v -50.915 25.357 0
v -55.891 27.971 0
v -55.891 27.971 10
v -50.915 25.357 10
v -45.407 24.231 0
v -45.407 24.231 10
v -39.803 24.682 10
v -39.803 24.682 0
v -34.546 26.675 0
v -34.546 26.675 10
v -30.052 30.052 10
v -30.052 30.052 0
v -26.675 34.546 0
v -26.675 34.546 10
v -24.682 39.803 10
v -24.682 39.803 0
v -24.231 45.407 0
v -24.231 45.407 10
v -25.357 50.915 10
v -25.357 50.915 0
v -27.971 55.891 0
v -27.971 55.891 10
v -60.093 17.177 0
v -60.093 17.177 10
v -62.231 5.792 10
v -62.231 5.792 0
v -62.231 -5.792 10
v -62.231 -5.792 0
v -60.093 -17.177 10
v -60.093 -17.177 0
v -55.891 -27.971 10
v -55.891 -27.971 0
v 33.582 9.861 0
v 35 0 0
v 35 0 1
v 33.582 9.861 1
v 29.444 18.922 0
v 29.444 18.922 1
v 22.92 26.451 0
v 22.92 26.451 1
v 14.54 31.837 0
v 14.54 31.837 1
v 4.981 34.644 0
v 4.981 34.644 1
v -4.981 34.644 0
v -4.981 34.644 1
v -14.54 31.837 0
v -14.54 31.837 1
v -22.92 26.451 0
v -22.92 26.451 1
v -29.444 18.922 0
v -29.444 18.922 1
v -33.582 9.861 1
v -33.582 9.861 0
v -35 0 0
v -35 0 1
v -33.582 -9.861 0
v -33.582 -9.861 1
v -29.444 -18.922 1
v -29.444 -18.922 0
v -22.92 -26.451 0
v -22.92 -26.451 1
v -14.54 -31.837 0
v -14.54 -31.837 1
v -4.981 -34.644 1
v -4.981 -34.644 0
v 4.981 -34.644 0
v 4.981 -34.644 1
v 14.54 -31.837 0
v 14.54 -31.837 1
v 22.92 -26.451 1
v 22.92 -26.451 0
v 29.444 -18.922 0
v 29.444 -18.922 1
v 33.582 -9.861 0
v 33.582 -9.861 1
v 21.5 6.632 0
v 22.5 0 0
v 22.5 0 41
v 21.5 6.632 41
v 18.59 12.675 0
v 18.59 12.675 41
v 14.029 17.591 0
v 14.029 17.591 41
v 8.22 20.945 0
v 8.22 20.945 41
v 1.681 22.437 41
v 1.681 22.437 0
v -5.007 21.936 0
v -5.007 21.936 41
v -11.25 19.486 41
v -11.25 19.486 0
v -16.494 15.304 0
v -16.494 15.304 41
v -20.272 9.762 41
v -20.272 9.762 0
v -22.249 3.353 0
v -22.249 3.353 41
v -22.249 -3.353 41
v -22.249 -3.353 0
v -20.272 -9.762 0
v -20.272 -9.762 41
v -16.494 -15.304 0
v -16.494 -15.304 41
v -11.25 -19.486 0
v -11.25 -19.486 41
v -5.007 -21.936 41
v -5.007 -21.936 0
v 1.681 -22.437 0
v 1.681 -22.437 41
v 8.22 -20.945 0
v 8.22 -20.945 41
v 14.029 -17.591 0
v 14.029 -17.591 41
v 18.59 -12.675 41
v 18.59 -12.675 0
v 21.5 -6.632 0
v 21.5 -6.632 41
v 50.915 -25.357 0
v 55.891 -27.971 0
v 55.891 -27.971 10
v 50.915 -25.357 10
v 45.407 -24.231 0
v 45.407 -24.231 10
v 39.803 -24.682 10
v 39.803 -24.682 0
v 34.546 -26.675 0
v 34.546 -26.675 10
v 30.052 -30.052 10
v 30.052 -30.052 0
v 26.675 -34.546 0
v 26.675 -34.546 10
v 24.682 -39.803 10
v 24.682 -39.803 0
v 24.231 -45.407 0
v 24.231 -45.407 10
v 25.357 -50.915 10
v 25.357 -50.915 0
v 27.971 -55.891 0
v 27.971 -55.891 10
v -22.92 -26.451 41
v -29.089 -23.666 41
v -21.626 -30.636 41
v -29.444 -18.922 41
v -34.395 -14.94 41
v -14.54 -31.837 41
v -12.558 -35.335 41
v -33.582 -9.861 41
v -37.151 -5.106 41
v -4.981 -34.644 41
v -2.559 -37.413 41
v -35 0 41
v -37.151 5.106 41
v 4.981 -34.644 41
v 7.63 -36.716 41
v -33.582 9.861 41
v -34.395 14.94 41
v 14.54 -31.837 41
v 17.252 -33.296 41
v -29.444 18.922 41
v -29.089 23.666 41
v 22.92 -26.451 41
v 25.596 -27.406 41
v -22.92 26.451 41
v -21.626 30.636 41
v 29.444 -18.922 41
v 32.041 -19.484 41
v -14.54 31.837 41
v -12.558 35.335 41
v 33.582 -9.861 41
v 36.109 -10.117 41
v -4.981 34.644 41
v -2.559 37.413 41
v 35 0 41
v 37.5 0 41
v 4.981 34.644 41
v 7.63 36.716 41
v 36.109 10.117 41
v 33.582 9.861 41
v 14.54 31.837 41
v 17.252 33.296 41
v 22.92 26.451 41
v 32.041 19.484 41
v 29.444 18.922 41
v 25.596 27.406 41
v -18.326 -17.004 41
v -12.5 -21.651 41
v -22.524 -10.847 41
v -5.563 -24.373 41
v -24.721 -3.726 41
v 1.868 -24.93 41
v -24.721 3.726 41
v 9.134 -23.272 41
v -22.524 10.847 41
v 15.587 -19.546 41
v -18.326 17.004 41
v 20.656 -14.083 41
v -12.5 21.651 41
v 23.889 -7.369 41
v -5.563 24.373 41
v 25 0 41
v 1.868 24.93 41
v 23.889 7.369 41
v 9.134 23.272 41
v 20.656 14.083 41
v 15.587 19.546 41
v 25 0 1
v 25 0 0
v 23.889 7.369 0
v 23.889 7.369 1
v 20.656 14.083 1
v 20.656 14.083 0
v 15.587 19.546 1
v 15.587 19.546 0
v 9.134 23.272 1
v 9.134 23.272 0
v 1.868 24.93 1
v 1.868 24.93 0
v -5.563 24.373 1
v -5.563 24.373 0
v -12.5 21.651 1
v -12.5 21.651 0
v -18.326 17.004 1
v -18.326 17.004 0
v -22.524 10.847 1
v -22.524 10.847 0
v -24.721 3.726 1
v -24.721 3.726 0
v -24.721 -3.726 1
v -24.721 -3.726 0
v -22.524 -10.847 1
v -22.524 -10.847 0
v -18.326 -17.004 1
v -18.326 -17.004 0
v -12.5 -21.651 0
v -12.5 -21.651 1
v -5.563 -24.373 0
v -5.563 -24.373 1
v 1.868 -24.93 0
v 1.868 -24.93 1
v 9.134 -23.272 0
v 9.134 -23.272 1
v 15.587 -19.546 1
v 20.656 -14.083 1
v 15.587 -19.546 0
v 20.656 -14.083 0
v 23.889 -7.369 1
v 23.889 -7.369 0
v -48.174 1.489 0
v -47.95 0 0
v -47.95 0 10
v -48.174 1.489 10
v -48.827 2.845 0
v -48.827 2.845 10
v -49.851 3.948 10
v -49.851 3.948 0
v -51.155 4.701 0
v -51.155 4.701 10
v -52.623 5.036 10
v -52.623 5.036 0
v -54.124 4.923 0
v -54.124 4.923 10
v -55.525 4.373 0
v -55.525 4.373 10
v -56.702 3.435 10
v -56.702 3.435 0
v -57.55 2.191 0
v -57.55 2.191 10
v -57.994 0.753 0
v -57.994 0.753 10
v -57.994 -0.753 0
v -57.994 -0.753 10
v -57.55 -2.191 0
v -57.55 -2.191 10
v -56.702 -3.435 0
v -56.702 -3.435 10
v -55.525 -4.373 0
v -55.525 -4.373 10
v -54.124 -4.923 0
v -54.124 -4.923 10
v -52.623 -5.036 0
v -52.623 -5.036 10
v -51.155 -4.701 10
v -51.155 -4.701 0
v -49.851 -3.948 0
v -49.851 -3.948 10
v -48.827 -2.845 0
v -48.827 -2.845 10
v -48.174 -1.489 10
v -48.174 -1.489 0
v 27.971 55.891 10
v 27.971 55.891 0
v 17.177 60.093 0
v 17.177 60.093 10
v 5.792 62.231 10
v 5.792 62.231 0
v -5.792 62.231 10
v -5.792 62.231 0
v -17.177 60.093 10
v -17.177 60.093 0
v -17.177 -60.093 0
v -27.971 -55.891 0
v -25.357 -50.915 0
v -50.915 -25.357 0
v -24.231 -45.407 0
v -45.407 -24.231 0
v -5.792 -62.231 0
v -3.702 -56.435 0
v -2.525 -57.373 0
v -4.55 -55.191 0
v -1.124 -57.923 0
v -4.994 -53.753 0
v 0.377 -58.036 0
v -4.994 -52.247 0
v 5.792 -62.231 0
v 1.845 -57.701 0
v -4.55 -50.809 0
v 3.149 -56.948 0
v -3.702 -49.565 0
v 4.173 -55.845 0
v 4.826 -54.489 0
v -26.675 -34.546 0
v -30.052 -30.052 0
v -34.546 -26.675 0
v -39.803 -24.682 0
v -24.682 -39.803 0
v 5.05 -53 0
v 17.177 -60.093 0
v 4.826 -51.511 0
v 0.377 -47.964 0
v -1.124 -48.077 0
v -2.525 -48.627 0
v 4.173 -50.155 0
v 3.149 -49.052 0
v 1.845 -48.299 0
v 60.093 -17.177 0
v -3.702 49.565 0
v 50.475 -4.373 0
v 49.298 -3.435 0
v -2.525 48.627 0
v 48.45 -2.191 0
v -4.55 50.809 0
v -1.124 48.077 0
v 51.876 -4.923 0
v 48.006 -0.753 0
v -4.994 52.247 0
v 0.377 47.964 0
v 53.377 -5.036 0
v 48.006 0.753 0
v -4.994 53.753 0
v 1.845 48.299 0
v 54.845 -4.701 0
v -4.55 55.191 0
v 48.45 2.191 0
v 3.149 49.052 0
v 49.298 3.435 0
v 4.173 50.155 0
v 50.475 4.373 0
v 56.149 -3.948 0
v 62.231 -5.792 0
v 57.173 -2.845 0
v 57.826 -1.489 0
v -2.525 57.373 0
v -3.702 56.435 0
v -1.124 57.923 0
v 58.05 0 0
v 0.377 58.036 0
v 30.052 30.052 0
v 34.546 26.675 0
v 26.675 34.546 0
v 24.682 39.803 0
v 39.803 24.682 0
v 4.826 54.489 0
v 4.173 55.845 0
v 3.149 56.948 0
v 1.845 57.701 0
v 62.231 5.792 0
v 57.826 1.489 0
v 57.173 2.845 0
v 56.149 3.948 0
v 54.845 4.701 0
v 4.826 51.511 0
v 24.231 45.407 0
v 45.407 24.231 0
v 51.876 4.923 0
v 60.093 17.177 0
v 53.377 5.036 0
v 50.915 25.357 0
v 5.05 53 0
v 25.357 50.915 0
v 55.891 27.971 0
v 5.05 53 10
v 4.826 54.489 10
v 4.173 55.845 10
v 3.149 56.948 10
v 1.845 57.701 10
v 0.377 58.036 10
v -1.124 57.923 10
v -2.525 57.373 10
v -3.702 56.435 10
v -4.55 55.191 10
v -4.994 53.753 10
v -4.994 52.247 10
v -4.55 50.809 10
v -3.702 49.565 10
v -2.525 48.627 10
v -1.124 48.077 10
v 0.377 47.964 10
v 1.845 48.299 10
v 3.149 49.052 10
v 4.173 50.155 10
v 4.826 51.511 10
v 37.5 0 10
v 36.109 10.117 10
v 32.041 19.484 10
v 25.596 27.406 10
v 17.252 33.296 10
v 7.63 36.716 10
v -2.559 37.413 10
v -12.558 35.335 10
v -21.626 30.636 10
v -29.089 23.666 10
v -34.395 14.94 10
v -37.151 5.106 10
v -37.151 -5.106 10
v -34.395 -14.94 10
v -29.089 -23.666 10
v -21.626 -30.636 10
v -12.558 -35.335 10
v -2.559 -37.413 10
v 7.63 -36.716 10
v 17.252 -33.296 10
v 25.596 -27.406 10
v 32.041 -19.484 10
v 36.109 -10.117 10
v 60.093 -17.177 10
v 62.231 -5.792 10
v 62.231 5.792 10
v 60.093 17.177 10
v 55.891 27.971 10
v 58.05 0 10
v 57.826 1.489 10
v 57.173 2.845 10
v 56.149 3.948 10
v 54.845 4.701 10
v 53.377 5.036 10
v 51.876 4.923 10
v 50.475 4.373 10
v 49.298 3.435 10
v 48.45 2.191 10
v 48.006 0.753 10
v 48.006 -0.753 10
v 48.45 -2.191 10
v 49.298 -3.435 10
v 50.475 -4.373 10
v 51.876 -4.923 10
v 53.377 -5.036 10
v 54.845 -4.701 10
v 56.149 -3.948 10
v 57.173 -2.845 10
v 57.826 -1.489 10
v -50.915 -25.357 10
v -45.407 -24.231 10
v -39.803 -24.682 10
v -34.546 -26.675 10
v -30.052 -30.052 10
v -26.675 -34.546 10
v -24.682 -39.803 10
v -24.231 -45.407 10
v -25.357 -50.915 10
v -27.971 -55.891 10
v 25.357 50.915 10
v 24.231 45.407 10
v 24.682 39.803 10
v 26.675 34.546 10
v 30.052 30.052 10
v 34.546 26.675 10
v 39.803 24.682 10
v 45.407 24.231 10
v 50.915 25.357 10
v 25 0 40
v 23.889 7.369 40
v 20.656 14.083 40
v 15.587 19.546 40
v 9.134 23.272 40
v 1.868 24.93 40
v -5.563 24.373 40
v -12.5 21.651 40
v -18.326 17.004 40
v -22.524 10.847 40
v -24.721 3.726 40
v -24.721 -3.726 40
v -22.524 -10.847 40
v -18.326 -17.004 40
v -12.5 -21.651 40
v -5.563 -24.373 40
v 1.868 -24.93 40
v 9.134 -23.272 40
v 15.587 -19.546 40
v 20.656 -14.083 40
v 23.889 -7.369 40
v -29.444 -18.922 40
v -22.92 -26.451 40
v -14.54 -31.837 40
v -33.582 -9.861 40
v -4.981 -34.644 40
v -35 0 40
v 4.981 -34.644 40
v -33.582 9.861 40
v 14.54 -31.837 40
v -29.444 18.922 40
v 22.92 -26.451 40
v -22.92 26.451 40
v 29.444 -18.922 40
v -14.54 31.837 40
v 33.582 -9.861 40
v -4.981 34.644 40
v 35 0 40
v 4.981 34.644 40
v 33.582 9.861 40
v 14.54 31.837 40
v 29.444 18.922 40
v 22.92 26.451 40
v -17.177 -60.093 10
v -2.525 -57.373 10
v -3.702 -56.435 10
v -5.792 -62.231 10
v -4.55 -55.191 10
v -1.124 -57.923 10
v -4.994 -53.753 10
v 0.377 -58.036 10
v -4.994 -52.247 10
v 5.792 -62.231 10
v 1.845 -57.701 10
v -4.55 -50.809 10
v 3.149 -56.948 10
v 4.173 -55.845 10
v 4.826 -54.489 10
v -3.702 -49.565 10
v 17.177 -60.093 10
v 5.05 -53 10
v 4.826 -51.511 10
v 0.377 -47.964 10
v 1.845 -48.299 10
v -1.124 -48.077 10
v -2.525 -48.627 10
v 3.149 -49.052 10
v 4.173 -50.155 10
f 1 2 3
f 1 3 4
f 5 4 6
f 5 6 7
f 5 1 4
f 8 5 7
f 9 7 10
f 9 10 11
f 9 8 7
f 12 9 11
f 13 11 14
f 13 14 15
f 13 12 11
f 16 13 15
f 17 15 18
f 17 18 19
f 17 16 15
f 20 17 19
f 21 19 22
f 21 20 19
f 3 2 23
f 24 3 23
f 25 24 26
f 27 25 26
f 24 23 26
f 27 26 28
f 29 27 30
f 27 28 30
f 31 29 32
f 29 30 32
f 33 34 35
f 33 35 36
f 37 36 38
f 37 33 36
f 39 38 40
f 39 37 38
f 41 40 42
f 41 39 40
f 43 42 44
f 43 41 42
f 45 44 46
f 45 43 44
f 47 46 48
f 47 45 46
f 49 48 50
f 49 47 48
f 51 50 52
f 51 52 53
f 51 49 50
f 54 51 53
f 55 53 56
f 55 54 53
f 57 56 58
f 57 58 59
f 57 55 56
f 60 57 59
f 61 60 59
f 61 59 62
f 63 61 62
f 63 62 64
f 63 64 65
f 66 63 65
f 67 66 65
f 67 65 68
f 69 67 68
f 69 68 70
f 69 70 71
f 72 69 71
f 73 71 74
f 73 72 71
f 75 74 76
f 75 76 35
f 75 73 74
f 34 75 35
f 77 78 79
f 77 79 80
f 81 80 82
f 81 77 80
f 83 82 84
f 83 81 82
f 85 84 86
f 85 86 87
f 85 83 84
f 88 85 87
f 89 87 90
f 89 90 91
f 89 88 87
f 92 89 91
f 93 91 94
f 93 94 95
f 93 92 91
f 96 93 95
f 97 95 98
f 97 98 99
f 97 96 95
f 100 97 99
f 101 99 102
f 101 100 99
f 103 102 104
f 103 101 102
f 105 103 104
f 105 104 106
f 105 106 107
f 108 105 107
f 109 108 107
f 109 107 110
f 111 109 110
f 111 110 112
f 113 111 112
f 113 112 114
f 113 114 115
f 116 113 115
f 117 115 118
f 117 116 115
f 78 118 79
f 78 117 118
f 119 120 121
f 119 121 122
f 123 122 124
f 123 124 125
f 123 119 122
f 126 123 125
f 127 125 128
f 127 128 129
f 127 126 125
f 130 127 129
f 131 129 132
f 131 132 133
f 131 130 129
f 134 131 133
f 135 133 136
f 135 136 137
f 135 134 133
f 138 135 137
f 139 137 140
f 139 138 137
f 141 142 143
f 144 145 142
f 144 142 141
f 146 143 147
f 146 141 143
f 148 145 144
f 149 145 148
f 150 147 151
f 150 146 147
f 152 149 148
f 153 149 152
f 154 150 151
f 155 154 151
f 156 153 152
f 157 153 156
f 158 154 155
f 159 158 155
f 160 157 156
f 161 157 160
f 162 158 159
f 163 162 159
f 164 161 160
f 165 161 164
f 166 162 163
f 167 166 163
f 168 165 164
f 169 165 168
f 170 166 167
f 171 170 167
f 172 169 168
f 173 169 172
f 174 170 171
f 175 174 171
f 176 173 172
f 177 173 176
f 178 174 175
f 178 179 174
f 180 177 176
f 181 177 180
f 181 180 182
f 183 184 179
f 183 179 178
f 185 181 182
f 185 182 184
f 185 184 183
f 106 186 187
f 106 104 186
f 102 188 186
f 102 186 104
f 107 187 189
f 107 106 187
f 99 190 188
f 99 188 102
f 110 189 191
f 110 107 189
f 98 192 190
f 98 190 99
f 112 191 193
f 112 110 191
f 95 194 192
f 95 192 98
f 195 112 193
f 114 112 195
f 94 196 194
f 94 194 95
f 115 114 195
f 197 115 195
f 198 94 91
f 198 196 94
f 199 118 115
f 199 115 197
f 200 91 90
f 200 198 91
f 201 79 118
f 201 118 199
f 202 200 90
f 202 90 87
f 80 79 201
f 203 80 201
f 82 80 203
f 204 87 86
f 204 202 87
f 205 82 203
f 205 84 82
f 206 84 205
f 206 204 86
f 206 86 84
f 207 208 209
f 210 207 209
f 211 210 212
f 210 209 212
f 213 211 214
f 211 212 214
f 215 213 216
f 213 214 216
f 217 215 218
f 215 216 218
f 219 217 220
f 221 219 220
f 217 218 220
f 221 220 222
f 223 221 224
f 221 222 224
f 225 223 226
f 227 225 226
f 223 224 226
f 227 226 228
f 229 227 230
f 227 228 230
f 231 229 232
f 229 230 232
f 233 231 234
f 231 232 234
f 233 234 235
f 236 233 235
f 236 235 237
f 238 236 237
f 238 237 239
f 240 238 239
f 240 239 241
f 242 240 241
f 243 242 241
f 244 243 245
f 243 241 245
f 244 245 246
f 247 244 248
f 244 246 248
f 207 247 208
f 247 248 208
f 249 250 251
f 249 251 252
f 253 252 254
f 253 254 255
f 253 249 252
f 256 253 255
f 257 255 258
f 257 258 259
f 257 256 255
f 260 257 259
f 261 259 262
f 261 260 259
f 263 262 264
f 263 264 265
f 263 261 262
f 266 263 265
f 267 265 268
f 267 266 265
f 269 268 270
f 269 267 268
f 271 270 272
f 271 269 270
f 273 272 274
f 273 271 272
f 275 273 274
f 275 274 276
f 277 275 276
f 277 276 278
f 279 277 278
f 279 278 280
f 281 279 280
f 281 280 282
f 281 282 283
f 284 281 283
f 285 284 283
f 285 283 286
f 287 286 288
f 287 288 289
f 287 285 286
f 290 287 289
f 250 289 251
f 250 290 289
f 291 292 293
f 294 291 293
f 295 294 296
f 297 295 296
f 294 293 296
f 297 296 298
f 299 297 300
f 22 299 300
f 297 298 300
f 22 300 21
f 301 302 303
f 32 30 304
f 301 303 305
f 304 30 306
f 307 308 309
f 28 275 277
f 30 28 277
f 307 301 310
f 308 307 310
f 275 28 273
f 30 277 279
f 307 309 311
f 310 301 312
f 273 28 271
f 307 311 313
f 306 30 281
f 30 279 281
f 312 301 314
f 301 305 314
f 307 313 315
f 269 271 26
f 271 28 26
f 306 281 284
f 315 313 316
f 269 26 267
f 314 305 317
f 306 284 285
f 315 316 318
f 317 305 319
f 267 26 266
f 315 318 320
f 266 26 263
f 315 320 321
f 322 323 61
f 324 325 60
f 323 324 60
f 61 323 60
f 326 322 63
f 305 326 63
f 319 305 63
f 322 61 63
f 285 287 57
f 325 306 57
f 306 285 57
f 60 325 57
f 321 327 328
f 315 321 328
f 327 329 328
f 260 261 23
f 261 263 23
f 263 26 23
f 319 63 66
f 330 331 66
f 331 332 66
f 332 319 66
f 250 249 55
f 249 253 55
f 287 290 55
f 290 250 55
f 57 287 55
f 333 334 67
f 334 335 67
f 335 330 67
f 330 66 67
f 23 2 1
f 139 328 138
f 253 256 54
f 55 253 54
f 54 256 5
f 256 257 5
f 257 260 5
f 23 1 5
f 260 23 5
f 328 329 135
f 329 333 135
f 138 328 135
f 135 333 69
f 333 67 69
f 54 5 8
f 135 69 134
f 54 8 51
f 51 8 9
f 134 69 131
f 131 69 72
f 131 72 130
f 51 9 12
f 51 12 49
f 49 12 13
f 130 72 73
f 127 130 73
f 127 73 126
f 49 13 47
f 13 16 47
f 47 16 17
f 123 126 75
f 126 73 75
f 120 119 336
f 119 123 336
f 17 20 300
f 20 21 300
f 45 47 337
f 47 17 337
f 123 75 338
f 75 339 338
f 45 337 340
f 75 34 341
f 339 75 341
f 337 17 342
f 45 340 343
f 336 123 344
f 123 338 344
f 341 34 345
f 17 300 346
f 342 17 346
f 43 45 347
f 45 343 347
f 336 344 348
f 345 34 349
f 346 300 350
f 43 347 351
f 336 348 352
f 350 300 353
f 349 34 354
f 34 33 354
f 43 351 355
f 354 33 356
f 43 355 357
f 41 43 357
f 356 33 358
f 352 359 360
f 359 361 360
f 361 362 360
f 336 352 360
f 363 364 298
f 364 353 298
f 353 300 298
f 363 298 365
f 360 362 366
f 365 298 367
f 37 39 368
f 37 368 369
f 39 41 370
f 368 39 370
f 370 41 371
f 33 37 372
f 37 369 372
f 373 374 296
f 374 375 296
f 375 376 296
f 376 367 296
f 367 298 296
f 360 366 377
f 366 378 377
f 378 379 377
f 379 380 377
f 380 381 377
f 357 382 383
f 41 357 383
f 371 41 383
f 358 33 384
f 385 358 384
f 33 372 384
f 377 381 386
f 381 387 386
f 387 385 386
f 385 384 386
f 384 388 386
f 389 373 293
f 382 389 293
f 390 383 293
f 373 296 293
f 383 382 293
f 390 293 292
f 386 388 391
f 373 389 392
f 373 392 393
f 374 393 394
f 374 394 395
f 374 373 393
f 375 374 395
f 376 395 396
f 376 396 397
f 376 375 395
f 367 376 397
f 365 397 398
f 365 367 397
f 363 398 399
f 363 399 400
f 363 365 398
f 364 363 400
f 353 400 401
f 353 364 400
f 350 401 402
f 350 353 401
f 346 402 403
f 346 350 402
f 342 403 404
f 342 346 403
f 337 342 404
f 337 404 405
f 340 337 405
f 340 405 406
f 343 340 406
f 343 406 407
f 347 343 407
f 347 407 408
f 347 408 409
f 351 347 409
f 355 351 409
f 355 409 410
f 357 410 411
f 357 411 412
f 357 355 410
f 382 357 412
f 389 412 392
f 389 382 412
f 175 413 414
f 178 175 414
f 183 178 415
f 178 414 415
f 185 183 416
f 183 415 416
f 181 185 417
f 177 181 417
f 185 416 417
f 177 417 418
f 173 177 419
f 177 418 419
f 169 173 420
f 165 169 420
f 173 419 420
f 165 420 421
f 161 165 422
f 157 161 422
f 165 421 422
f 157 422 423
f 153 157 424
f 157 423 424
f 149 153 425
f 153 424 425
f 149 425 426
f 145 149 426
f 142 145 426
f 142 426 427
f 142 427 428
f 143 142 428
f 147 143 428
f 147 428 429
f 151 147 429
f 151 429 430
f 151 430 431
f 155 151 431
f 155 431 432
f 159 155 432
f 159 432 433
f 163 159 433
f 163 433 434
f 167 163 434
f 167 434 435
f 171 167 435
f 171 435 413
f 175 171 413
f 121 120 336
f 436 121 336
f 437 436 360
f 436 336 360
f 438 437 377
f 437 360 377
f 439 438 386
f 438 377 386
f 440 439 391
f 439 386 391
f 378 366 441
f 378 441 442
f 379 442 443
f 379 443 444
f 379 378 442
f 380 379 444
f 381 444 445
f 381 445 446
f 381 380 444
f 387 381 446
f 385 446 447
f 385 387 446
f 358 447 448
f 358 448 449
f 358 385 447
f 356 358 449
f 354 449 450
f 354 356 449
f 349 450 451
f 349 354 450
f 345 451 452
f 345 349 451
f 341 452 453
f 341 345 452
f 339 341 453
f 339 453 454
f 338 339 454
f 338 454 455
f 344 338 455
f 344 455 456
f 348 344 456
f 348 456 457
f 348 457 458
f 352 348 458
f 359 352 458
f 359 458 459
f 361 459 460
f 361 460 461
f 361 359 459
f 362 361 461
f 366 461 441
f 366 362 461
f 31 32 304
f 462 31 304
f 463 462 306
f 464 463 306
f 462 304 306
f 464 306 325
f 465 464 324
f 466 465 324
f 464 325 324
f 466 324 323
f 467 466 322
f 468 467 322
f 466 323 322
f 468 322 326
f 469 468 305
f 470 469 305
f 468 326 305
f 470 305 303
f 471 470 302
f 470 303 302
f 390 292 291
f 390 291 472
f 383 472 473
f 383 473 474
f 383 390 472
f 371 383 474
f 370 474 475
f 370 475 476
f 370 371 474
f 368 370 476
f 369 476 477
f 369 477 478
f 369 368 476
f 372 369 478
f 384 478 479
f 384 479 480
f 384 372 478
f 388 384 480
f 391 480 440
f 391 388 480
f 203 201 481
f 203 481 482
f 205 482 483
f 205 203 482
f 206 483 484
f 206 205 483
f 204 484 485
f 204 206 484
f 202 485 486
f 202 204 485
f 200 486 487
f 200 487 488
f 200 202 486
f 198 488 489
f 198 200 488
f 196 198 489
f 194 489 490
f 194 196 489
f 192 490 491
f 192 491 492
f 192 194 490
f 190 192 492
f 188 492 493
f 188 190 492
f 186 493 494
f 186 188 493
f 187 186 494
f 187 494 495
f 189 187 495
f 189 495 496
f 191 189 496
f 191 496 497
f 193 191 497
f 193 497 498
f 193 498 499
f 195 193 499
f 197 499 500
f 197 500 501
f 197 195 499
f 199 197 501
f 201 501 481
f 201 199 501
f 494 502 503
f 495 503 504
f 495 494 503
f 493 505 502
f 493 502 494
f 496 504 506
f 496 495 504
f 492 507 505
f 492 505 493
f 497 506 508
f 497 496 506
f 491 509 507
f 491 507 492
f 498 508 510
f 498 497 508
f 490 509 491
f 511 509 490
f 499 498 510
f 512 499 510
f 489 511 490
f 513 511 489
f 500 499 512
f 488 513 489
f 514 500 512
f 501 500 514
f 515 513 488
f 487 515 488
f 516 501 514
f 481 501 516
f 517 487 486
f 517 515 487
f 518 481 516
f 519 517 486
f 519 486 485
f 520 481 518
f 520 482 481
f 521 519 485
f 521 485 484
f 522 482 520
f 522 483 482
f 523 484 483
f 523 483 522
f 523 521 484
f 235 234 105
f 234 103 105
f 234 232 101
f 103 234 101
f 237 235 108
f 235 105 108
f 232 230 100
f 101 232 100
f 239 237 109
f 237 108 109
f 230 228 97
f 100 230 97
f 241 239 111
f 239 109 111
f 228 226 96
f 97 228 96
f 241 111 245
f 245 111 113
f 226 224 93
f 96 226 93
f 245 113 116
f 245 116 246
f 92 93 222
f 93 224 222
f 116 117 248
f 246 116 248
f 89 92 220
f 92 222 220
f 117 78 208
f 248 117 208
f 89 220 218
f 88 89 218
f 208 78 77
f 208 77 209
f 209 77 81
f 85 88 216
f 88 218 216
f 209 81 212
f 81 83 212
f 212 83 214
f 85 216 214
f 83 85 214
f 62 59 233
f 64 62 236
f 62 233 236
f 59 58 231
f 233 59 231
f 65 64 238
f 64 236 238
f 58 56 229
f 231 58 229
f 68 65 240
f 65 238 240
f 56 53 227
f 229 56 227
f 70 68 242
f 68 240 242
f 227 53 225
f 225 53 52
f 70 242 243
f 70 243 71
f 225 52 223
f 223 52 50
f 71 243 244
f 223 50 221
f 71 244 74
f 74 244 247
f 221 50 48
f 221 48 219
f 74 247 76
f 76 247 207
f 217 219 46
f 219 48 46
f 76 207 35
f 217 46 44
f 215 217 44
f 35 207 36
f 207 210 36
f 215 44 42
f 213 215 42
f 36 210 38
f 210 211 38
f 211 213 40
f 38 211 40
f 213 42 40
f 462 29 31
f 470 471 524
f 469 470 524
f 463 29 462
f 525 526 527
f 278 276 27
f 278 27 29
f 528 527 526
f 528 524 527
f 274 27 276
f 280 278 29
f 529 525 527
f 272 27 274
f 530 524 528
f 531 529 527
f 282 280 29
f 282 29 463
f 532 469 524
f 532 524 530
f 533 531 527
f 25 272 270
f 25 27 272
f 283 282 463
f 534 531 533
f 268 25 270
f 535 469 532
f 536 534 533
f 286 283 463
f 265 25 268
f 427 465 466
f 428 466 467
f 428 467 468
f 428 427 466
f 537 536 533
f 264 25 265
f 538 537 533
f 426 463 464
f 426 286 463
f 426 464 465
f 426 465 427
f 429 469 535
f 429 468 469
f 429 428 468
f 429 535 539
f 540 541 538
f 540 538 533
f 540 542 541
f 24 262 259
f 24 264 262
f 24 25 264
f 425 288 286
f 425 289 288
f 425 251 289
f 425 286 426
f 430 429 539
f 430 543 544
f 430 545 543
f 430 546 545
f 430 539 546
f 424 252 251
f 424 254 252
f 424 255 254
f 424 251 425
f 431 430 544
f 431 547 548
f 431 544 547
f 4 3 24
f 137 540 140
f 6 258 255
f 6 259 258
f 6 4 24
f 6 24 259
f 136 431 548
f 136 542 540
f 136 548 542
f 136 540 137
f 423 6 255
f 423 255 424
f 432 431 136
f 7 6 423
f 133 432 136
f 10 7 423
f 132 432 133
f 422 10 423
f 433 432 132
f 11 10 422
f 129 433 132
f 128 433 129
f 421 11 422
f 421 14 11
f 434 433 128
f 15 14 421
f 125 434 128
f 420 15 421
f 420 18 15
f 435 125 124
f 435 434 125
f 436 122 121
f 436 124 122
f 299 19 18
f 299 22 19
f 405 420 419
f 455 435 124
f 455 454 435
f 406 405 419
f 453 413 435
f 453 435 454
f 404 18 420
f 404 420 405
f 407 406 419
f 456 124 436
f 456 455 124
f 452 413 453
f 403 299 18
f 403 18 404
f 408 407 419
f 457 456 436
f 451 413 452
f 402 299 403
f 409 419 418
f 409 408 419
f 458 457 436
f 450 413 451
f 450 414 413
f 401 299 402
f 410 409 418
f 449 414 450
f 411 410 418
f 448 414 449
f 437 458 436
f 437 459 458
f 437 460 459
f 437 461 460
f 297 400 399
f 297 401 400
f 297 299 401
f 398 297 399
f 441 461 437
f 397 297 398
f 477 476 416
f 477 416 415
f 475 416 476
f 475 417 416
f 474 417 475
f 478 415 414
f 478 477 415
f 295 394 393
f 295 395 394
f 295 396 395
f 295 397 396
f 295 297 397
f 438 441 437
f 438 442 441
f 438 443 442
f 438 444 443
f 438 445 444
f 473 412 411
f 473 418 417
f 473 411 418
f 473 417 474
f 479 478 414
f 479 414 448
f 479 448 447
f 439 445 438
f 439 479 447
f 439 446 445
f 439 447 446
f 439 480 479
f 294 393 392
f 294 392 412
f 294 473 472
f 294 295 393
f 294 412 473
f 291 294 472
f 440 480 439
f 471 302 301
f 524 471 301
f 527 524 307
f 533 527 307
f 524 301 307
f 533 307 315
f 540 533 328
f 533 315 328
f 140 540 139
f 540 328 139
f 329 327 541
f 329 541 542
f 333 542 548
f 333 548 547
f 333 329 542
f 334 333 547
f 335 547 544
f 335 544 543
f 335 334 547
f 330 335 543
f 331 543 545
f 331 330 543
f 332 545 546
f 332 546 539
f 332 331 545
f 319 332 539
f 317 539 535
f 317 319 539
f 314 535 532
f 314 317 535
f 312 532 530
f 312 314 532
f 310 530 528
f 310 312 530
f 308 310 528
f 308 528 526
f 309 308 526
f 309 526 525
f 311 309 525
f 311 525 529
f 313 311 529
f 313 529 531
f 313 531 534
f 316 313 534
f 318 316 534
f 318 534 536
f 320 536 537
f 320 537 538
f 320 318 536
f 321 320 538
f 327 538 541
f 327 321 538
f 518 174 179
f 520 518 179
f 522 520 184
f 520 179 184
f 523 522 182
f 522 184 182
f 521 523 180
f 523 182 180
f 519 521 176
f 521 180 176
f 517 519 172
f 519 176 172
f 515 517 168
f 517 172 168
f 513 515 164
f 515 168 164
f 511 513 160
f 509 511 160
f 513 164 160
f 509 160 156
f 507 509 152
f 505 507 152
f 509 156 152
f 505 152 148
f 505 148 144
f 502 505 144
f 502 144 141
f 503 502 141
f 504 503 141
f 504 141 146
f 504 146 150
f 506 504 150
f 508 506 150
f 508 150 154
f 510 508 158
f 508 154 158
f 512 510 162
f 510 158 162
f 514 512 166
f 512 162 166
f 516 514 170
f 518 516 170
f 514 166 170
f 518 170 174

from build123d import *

# Parameters (mm, degrees)
SZKIC1_R                    = 37.5
SZKIC1_R_2                  = 22.5
DODANIE_WYCI_GNI_CIE1_DEPTH = 41
SZKIC2_R                    = 35
SZKIC2_R_2                  = 25
WYTNIJ_WYCI_GNI_CIE1_DEPTH  = 1
SZKIC3_R                    = 5.05
SZKIC3_R_2                  = 37.5
DODANIE_WYCI_GNI_CIE2_DEPTH = 10
SZYK_KO_OWY1_OUTLINE_R      = 5.05
SZYK_KO_OWY1_DEPTH          = 10


# Read off the part's stored shape, not the designer's step: Szyk kołowy1
with BuildPart() as part:
    # Szkic1 → Dodanie-wyciągnięcie1 (new body)
    with BuildSketch(Plane.XY):
        Circle(SZKIC1_R)
        Circle(SZKIC1_R_2, mode=Mode.SUBTRACT)
    extrude(amount=DODANIE_WYCI_GNI_CIE1_DEPTH)

    # Szkic2 → Wytnij-wyciągnięcie1 (cut)
    with BuildSketch(Plane.XY.offset(41)):
        Circle(SZKIC2_R)
        Circle(SZKIC2_R_2, mode=Mode.SUBTRACT)
    wytnij_wyci_gni_cie1 = extrude(amount=-WYTNIJ_WYCI_GNI_CIE1_DEPTH, mode=Mode.SUBTRACT)

    # Lustro1: Wytnij-wyciągnięcie1 across plane
    add(wytnij_wyci_gni_cie1.mirror(Plane.XY.offset(20.5)), mode=Mode.SUBTRACT)

    # Szkic3 → Dodanie-wyciągnięcie2 (add)
    with BuildSketch(Plane.XY):
        with BuildLine():
            ThreePointArc((-27.971489431, -55.891374818), (44.194173824, 44.194173824), (-55.891374818, -27.971489431))
            ThreePointArc((-55.891374818, -27.971489431), (-30.0520382, -30.0520382), (-27.971489431, -55.891374818))
        make_face()
        with Locations((0, -53)):
            Circle(SZKIC3_R, mode=Mode.SUBTRACT)
        Circle(SZKIC3_R_2, mode=Mode.SUBTRACT)
    extrude(amount=DODANIE_WYCI_GNI_CIE2_DEPTH)

    # Szyk kołowy1 outline → Szyk kołowy1 (cut)
    with BuildSketch(Plane.XY):
        with Locations((-53, 0)):
            Circle(SZYK_KO_OWY1_OUTLINE_R)
        with BuildLine():
            ThreePointArc((-55.891374818, 27.971489431), (-30.0520382, 30.0520382), (-27.971489431, 55.891374818))
            ThreePointArc((-27.971489431, 55.891374818), (-44.194173824, 44.194173824), (-55.891374818, 27.971489431))
        make_face()
        with BuildLine():
            ThreePointArc((27.971489431, -55.891374818), (44.194173824, -44.194173824), (55.891374818, -27.971489431))
            ThreePointArc((55.891374818, -27.971489431), (30.0520382, -30.0520382), (27.971489431, -55.891374818))
        make_face()
        with BuildLine():
            ThreePointArc((55.891374818, 27.971489431), (44.194173824, 44.194173824), (27.971489431, 55.891374818))
            ThreePointArc((27.971489431, 55.891374818), (30.0520382, 30.0520382), (55.891374818, 27.971489431))
        make_face()
        with Locations((0, 53)):
            Circle(SZYK_KO_OWY1_OUTLINE_R)
        with Locations((53, 0)):
            Circle(SZYK_KO_OWY1_OUTLINE_R)
    extrude(amount=SZYK_KO_OWY1_DEPTH, mode=Mode.SUBTRACT)


solid = part.part
